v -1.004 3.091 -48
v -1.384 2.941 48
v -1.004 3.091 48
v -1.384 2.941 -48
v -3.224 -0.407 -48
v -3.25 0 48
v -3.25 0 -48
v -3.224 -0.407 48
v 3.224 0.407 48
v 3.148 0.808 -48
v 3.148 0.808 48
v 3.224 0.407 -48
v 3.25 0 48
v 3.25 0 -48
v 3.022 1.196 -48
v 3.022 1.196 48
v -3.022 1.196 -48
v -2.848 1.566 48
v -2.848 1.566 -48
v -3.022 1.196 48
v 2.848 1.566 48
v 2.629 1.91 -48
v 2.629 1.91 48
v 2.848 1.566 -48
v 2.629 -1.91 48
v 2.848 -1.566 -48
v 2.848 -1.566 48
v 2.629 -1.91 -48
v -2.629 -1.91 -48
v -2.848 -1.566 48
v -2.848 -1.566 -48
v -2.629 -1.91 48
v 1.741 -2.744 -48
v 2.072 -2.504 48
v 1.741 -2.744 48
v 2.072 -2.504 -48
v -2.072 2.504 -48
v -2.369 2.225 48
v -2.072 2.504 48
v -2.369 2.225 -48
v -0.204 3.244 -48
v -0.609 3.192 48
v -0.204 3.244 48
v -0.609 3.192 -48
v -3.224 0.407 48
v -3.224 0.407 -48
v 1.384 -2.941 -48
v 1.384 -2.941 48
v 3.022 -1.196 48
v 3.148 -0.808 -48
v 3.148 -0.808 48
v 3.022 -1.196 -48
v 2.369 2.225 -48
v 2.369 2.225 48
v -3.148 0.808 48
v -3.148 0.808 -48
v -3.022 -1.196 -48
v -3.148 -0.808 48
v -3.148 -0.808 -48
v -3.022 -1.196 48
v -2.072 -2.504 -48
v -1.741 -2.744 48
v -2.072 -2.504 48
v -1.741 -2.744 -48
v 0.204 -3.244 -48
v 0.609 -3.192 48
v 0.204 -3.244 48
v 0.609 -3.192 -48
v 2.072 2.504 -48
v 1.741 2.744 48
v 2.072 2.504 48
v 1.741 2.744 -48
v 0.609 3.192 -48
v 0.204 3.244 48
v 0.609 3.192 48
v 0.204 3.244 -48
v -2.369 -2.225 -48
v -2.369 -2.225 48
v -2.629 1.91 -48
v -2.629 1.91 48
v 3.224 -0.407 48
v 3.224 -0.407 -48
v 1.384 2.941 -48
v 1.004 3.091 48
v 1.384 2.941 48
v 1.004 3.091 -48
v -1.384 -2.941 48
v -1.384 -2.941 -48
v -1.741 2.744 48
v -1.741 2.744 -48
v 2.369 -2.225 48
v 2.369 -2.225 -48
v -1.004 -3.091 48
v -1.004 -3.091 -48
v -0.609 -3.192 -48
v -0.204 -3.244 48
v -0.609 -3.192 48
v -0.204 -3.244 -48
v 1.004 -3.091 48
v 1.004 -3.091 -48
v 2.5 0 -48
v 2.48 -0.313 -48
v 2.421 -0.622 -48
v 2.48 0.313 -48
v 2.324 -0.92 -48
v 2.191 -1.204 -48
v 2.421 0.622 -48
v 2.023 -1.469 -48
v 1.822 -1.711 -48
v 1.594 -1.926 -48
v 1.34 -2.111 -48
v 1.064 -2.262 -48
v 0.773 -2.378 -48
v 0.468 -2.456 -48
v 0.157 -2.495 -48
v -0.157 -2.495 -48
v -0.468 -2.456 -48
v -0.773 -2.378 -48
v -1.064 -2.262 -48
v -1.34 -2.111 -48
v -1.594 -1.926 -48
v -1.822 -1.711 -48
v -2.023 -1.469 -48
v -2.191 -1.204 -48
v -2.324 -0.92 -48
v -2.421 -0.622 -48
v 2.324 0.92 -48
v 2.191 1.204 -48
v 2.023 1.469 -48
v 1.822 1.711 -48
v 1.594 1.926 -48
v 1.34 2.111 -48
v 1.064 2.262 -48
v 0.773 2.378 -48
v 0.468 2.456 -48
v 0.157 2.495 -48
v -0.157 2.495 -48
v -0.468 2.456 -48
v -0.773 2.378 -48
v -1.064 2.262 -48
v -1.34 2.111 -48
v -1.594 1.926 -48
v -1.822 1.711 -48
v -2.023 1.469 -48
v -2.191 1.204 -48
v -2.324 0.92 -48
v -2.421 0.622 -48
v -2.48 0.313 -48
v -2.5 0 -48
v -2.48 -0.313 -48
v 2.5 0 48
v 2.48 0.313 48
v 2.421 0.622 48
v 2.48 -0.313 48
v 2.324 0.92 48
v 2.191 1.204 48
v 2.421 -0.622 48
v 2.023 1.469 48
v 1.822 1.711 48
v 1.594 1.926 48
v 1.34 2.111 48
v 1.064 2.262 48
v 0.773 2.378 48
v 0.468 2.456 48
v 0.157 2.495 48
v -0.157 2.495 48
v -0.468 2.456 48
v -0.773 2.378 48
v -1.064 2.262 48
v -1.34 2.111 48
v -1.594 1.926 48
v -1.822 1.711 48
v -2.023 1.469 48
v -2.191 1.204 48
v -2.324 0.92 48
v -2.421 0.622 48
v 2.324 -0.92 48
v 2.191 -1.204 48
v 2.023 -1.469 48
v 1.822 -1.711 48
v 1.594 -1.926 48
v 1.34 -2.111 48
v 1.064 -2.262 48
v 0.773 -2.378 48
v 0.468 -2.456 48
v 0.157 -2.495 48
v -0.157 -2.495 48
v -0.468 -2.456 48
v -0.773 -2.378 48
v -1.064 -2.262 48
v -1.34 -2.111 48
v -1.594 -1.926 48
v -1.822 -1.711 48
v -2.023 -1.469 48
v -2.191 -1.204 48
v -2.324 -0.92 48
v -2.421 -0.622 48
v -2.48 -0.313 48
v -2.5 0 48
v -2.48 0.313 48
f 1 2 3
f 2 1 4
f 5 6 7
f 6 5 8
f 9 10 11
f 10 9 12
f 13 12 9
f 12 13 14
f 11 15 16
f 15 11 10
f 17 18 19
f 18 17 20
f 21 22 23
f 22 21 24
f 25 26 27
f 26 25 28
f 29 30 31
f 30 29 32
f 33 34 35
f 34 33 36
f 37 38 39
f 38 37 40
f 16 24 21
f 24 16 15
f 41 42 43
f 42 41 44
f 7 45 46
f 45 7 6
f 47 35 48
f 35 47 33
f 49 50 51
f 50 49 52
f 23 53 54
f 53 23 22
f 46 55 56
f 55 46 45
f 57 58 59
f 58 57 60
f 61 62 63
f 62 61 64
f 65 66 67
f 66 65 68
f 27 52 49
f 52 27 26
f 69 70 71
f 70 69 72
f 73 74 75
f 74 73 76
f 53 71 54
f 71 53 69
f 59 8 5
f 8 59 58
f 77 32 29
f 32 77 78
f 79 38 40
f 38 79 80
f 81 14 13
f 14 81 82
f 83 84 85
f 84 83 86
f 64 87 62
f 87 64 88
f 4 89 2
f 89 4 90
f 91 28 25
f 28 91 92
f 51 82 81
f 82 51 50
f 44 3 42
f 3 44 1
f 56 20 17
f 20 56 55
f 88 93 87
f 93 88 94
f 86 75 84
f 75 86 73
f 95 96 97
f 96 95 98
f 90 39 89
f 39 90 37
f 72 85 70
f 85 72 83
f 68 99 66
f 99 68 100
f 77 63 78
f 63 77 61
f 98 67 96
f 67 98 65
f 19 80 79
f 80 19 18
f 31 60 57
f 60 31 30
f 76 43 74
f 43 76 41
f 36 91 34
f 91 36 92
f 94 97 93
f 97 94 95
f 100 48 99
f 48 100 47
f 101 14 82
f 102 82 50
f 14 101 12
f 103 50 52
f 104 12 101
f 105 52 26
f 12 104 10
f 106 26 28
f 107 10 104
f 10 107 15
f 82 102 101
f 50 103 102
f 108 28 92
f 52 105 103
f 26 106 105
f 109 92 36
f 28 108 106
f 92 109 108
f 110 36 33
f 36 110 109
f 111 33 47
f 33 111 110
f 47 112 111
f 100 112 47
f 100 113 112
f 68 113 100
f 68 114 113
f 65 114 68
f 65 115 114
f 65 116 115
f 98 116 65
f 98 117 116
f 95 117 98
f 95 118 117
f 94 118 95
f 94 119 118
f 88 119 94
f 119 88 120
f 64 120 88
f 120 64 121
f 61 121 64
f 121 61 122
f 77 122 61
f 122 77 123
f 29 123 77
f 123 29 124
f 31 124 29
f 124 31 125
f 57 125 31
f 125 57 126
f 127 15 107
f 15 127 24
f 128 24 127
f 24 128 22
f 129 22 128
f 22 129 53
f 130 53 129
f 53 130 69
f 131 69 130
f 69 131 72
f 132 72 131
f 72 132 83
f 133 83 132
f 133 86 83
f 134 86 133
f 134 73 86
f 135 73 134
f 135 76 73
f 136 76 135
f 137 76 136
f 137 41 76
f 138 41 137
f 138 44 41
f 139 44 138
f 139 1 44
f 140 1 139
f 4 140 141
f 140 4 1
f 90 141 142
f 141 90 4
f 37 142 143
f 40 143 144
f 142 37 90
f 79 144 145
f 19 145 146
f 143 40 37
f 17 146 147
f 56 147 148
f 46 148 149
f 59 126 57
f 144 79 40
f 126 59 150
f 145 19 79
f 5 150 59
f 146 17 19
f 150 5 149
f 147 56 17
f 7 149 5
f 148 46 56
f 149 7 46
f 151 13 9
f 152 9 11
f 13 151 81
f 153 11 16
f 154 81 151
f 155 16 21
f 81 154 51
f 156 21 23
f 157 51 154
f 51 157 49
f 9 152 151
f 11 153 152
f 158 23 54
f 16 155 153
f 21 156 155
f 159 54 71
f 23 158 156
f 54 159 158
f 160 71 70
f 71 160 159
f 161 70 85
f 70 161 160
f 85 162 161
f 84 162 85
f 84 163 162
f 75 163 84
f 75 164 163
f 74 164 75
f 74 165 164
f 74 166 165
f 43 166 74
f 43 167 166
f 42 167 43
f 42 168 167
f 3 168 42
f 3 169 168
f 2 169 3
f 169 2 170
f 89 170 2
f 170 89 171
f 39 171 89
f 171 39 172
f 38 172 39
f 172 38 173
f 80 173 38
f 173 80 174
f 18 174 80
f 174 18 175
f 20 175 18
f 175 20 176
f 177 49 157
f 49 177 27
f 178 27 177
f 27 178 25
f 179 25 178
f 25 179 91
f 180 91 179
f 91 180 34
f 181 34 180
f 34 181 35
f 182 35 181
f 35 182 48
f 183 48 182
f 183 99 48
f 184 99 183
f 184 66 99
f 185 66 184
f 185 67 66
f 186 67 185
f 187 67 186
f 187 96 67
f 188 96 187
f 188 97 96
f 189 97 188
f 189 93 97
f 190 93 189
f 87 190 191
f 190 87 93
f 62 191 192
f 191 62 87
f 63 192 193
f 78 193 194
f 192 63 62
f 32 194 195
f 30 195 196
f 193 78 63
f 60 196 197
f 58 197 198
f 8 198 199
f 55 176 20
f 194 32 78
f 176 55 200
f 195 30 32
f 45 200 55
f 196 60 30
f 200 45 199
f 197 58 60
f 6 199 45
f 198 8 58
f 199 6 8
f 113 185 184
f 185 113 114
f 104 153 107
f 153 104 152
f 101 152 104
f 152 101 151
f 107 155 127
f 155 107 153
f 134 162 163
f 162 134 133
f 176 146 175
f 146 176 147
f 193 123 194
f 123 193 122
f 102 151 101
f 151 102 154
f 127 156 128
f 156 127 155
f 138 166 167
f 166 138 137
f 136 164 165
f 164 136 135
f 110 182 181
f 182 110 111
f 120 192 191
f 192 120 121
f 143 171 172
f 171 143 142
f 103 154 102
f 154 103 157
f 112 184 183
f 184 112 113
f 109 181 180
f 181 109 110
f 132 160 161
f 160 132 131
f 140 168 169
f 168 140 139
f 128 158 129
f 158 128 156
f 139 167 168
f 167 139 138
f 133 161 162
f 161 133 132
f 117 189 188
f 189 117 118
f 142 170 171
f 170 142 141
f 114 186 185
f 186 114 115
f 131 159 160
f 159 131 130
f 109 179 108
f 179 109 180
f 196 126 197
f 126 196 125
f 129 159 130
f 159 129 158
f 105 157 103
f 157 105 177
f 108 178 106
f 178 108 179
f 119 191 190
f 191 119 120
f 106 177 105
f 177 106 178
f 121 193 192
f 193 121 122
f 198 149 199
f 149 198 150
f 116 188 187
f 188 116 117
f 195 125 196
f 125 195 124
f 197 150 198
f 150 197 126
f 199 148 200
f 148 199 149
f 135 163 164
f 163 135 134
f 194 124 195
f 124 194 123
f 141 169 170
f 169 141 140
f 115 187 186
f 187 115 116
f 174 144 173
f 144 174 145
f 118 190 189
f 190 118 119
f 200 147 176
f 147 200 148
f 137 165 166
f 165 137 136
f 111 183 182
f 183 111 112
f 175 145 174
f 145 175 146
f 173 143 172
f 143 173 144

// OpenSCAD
$fn = 50;


difference() {
	union() {
		translate(v = [0, 0, -48.0000000000]) {
			cylinder(h = 96, r = 3.2500000000);
		}
	}
	union() {
		translate(v = [0, 0, -100.0000000000]) {
			cylinder(h = 200, r = 2.5000000000);
		}
	}
}
